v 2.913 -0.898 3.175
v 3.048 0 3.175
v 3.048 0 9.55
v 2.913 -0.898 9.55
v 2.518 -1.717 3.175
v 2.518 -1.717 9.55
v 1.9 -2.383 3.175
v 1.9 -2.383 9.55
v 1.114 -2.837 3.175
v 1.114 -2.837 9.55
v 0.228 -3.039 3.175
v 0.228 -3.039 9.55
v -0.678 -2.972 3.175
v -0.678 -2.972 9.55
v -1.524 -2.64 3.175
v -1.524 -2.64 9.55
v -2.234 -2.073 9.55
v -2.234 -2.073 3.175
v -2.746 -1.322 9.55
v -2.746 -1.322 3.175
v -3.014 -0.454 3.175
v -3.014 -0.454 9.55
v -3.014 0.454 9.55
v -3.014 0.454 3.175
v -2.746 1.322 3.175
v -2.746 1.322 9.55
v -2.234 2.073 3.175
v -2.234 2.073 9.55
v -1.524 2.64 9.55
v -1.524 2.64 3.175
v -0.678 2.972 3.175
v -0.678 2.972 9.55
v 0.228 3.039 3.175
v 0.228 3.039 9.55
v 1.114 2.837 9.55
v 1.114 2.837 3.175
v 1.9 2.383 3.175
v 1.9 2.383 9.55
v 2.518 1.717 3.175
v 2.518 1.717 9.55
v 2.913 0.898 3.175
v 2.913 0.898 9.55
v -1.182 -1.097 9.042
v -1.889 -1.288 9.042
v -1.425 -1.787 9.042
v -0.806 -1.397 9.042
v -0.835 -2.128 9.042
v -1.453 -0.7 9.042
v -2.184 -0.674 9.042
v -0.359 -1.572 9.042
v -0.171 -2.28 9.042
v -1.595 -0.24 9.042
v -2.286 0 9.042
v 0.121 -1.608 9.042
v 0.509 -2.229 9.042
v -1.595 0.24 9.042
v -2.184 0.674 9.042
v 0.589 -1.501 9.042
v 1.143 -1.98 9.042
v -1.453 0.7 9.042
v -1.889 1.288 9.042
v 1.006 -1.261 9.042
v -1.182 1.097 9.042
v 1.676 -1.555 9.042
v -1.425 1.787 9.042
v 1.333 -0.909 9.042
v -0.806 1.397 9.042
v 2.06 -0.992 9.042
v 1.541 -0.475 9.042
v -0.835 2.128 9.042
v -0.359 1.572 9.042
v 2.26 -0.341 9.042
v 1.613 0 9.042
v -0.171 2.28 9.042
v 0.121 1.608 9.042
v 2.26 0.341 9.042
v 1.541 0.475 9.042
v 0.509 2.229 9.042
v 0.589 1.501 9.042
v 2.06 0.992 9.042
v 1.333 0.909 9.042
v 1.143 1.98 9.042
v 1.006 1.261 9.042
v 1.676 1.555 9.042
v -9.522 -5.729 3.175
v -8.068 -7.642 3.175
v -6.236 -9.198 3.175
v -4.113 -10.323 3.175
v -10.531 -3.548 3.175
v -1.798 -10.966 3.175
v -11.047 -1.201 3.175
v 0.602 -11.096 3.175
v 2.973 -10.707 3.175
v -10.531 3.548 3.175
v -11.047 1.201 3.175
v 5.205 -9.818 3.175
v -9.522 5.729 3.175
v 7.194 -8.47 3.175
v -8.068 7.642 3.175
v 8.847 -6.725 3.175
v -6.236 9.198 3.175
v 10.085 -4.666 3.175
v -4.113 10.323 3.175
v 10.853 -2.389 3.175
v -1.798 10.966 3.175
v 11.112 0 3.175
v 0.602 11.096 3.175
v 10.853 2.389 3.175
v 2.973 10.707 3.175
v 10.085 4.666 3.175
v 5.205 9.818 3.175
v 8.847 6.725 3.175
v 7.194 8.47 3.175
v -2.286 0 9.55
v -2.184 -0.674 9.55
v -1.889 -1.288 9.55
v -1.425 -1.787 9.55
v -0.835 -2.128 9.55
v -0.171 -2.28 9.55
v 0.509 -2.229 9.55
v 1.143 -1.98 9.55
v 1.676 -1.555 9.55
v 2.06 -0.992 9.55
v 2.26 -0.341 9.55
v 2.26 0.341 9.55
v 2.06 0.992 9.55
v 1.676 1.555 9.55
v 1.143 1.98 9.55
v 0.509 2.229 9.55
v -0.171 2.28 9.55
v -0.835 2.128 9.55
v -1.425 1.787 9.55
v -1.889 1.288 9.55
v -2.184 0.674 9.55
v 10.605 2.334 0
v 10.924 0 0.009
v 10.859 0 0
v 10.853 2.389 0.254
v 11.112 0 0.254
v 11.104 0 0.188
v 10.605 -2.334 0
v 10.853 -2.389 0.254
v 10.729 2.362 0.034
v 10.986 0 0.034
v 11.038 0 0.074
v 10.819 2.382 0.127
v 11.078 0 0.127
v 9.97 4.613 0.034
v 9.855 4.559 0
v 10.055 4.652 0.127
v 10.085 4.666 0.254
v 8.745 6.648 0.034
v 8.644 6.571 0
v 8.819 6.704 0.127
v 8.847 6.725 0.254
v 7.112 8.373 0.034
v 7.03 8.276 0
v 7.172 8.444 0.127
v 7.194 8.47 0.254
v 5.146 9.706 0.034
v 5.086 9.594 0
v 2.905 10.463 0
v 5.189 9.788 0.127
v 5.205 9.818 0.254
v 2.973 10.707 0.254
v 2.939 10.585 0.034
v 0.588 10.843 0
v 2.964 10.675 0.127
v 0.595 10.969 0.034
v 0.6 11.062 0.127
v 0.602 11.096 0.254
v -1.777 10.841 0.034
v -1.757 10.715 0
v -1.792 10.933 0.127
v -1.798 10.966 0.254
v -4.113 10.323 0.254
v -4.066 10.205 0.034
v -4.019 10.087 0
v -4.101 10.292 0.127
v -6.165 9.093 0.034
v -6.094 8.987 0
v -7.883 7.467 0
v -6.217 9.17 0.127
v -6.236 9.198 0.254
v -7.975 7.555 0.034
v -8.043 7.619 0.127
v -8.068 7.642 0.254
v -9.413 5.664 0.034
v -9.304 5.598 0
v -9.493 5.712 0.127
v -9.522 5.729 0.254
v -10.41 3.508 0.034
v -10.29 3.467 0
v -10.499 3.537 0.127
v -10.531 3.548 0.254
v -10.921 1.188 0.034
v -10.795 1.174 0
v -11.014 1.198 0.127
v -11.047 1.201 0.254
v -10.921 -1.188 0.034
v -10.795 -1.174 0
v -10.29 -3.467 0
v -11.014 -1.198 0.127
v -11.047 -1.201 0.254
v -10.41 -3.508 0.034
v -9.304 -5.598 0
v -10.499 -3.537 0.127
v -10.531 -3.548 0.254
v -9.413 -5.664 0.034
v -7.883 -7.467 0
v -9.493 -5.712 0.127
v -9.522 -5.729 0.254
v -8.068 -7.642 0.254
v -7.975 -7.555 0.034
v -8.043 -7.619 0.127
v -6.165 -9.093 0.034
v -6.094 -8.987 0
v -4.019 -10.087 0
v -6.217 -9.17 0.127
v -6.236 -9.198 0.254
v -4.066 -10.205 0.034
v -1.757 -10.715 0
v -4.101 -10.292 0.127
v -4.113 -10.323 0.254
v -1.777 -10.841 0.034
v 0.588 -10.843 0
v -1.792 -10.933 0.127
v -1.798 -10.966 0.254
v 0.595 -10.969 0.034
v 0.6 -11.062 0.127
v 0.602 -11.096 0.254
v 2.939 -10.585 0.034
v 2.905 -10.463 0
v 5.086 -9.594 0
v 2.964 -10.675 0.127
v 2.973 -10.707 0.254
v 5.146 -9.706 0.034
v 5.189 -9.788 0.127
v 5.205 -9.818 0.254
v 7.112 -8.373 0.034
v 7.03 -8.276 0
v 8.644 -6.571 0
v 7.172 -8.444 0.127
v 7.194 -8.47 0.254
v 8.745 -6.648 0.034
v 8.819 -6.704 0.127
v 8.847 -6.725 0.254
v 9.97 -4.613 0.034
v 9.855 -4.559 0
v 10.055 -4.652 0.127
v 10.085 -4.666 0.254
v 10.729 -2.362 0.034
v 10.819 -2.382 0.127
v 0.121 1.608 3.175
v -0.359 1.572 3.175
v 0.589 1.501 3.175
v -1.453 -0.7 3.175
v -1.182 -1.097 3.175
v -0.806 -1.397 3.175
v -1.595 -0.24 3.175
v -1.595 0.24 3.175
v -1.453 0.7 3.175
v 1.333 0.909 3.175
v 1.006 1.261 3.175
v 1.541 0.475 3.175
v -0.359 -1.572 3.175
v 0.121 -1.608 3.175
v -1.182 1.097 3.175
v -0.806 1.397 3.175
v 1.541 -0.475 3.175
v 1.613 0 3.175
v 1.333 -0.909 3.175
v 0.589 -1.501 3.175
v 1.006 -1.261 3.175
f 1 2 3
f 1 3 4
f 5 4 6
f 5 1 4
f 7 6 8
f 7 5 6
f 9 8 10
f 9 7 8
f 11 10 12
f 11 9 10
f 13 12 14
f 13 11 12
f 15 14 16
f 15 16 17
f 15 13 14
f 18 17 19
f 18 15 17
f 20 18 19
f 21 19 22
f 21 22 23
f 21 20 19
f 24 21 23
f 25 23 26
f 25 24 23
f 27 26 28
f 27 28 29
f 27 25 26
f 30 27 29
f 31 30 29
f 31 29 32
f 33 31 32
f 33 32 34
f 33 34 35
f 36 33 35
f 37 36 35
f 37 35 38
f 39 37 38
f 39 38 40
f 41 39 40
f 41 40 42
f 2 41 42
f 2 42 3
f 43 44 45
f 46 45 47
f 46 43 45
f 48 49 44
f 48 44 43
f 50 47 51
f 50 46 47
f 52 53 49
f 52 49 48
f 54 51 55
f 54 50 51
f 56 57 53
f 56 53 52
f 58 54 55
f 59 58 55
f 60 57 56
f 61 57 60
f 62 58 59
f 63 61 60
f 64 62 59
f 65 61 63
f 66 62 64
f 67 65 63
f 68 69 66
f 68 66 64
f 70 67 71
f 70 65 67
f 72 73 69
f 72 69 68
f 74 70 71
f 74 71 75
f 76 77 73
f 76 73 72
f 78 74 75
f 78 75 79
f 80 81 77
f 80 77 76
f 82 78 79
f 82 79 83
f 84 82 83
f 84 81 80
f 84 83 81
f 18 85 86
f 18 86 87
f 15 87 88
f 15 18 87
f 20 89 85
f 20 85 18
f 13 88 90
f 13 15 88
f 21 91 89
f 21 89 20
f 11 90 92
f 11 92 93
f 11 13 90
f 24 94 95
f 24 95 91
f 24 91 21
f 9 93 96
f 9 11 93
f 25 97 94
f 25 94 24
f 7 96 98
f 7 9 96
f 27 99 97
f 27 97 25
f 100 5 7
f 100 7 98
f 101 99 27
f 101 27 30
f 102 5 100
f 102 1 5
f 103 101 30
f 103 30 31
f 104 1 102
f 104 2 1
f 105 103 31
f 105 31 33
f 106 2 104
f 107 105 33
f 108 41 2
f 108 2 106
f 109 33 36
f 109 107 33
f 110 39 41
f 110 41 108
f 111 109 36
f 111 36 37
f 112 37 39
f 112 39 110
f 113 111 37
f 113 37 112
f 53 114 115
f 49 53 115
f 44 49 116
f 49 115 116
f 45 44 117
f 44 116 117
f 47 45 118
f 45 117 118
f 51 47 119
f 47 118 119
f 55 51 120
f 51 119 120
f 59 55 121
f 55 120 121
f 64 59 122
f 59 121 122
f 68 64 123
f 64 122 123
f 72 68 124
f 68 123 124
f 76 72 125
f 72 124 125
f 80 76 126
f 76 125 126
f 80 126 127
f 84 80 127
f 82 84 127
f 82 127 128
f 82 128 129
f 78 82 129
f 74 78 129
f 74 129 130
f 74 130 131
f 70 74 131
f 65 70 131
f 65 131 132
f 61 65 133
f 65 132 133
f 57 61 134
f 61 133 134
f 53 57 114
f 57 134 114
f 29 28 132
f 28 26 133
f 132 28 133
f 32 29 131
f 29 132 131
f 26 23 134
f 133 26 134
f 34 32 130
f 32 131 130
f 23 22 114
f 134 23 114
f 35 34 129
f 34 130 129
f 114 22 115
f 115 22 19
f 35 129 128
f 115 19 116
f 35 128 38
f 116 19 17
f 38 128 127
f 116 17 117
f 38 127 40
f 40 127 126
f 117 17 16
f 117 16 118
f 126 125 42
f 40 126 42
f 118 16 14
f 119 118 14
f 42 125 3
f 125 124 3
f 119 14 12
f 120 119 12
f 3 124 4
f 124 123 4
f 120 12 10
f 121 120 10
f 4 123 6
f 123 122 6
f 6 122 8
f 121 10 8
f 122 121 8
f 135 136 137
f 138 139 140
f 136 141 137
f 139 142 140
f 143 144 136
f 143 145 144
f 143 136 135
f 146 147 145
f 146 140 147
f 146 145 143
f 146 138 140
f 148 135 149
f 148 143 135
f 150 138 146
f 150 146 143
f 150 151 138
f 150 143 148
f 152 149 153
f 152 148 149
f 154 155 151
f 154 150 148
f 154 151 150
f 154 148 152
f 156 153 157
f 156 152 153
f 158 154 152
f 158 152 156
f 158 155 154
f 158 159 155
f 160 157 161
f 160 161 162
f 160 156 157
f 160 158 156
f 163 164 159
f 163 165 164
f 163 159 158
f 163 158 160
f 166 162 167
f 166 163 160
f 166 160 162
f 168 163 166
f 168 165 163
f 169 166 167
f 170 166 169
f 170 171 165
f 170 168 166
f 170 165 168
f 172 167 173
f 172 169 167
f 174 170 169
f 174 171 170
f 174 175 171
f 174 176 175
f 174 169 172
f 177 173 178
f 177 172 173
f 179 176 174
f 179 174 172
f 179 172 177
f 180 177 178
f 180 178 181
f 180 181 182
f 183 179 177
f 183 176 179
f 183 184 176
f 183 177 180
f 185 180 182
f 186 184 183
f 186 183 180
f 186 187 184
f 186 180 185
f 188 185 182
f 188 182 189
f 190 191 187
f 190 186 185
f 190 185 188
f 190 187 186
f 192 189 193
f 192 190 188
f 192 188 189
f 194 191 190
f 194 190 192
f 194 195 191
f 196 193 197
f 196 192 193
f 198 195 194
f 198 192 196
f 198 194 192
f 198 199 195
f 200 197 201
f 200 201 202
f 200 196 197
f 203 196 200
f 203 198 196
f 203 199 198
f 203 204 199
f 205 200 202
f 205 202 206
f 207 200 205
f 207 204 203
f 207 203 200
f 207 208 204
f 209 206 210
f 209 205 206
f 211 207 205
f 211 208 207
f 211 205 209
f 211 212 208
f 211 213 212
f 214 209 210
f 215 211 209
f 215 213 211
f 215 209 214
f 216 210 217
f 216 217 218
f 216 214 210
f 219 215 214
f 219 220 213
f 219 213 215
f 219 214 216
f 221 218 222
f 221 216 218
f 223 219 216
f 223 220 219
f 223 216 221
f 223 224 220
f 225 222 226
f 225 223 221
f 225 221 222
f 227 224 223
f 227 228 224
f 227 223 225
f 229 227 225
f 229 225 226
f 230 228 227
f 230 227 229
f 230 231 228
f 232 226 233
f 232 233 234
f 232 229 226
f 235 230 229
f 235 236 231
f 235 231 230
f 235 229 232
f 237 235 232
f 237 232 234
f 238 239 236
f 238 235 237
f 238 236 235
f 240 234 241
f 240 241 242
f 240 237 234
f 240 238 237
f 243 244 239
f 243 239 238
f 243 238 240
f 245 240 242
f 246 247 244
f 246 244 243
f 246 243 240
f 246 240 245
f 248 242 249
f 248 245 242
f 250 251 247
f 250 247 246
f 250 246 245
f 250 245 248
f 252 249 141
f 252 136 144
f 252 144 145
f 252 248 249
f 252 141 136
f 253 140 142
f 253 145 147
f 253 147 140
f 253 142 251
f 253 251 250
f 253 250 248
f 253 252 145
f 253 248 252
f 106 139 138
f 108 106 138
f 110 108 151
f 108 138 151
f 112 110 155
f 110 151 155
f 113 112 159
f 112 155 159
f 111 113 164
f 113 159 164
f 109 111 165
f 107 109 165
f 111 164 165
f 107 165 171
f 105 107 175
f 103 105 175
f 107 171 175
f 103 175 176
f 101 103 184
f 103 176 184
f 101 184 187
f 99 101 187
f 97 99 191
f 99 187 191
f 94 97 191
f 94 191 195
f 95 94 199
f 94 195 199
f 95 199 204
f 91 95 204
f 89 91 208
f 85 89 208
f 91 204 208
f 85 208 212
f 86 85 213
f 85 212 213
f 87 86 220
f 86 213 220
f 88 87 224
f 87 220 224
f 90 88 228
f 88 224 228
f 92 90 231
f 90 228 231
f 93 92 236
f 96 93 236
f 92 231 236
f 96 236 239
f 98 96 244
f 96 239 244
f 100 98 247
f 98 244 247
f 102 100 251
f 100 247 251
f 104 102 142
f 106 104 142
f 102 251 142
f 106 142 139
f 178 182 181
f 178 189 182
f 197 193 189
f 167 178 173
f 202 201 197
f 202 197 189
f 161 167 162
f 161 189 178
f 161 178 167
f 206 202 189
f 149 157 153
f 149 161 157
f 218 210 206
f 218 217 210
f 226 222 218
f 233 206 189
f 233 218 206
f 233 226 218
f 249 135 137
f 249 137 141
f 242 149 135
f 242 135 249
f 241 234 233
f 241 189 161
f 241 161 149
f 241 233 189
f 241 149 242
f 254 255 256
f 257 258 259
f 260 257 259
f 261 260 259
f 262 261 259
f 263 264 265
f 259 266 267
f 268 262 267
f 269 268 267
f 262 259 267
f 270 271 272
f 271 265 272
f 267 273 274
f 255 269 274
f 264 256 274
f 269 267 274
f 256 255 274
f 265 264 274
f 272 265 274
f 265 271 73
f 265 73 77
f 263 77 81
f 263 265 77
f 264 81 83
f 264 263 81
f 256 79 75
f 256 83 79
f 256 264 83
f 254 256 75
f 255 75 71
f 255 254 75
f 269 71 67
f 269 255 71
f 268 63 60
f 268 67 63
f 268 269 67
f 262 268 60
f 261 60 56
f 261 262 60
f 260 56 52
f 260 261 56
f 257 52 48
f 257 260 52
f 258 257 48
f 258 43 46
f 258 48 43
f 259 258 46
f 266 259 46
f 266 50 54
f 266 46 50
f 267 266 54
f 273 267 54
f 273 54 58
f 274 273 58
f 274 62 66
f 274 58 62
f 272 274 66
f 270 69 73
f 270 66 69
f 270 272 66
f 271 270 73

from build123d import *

# Parameters (mm, degrees)
F0_R     = 11.1125
F0_R_2   = 3.048
F1_DEPTH = 3.175
F3_R     = 3.048
F4_DEPTH = 9.5504
F2_R     = 1.6129
F5_DEPTH = 25.4
F6_R     = 1.6129
F7_DEPTH = 3.175
F9_DEPTH = 0.508
F10_R    = 0.254


with BuildPart() as f1:
    # F0 (on Top) → F1 (new body)
    with BuildSketch(Plane.XY):
        Circle(F0_R)
        Circle(F0_R_2, mode=Mode.SUBTRACT)
    extrude(amount=F1_DEPTH)

    # F3 (on face) → F4 (join)
    with BuildSketch(Plane(origin=(0, 0, 0), x_dir=(1, 0, 0), z_dir=(0, 0, -1))):
        Circle(F3_R)
    extrude(amount=-F4_DEPTH)

    # F2 (on Top) → F5 (cut)
    with BuildSketch(Plane.XY):
        Circle(F2_R)
    extrude(amount=F5_DEPTH, mode=Mode.SUBTRACT)

    # F6 (on face) → F7 (join)
    with BuildSketch(Plane(origin=(0, 0, 0), x_dir=(1, 0, 0), z_dir=(0, 0, -1))):
        Circle(F6_R)
    extrude(amount=-F7_DEPTH)

    # F8 (on face) → F9 (cut)
    with BuildSketch(Plane.XY.offset(9.5504)):
        with BuildLine():
            ThreePointArc((2.286, 0), (0, 2.286), (-2.286, 0))
            ThreePointArc((-2.286, 0), (0, -2.286), (2.286, 0))
        make_face()
    extrude(amount=-F9_DEPTH, mode=Mode.SUBTRACT)

    # F10
    f10_edges = [f1.edges().sort_by_distance(p)[0] for p in [
        (-11.1125, 0, 0),
    ]]
    fillet(f10_edges, radius=F10_R)


solid = f1.part
